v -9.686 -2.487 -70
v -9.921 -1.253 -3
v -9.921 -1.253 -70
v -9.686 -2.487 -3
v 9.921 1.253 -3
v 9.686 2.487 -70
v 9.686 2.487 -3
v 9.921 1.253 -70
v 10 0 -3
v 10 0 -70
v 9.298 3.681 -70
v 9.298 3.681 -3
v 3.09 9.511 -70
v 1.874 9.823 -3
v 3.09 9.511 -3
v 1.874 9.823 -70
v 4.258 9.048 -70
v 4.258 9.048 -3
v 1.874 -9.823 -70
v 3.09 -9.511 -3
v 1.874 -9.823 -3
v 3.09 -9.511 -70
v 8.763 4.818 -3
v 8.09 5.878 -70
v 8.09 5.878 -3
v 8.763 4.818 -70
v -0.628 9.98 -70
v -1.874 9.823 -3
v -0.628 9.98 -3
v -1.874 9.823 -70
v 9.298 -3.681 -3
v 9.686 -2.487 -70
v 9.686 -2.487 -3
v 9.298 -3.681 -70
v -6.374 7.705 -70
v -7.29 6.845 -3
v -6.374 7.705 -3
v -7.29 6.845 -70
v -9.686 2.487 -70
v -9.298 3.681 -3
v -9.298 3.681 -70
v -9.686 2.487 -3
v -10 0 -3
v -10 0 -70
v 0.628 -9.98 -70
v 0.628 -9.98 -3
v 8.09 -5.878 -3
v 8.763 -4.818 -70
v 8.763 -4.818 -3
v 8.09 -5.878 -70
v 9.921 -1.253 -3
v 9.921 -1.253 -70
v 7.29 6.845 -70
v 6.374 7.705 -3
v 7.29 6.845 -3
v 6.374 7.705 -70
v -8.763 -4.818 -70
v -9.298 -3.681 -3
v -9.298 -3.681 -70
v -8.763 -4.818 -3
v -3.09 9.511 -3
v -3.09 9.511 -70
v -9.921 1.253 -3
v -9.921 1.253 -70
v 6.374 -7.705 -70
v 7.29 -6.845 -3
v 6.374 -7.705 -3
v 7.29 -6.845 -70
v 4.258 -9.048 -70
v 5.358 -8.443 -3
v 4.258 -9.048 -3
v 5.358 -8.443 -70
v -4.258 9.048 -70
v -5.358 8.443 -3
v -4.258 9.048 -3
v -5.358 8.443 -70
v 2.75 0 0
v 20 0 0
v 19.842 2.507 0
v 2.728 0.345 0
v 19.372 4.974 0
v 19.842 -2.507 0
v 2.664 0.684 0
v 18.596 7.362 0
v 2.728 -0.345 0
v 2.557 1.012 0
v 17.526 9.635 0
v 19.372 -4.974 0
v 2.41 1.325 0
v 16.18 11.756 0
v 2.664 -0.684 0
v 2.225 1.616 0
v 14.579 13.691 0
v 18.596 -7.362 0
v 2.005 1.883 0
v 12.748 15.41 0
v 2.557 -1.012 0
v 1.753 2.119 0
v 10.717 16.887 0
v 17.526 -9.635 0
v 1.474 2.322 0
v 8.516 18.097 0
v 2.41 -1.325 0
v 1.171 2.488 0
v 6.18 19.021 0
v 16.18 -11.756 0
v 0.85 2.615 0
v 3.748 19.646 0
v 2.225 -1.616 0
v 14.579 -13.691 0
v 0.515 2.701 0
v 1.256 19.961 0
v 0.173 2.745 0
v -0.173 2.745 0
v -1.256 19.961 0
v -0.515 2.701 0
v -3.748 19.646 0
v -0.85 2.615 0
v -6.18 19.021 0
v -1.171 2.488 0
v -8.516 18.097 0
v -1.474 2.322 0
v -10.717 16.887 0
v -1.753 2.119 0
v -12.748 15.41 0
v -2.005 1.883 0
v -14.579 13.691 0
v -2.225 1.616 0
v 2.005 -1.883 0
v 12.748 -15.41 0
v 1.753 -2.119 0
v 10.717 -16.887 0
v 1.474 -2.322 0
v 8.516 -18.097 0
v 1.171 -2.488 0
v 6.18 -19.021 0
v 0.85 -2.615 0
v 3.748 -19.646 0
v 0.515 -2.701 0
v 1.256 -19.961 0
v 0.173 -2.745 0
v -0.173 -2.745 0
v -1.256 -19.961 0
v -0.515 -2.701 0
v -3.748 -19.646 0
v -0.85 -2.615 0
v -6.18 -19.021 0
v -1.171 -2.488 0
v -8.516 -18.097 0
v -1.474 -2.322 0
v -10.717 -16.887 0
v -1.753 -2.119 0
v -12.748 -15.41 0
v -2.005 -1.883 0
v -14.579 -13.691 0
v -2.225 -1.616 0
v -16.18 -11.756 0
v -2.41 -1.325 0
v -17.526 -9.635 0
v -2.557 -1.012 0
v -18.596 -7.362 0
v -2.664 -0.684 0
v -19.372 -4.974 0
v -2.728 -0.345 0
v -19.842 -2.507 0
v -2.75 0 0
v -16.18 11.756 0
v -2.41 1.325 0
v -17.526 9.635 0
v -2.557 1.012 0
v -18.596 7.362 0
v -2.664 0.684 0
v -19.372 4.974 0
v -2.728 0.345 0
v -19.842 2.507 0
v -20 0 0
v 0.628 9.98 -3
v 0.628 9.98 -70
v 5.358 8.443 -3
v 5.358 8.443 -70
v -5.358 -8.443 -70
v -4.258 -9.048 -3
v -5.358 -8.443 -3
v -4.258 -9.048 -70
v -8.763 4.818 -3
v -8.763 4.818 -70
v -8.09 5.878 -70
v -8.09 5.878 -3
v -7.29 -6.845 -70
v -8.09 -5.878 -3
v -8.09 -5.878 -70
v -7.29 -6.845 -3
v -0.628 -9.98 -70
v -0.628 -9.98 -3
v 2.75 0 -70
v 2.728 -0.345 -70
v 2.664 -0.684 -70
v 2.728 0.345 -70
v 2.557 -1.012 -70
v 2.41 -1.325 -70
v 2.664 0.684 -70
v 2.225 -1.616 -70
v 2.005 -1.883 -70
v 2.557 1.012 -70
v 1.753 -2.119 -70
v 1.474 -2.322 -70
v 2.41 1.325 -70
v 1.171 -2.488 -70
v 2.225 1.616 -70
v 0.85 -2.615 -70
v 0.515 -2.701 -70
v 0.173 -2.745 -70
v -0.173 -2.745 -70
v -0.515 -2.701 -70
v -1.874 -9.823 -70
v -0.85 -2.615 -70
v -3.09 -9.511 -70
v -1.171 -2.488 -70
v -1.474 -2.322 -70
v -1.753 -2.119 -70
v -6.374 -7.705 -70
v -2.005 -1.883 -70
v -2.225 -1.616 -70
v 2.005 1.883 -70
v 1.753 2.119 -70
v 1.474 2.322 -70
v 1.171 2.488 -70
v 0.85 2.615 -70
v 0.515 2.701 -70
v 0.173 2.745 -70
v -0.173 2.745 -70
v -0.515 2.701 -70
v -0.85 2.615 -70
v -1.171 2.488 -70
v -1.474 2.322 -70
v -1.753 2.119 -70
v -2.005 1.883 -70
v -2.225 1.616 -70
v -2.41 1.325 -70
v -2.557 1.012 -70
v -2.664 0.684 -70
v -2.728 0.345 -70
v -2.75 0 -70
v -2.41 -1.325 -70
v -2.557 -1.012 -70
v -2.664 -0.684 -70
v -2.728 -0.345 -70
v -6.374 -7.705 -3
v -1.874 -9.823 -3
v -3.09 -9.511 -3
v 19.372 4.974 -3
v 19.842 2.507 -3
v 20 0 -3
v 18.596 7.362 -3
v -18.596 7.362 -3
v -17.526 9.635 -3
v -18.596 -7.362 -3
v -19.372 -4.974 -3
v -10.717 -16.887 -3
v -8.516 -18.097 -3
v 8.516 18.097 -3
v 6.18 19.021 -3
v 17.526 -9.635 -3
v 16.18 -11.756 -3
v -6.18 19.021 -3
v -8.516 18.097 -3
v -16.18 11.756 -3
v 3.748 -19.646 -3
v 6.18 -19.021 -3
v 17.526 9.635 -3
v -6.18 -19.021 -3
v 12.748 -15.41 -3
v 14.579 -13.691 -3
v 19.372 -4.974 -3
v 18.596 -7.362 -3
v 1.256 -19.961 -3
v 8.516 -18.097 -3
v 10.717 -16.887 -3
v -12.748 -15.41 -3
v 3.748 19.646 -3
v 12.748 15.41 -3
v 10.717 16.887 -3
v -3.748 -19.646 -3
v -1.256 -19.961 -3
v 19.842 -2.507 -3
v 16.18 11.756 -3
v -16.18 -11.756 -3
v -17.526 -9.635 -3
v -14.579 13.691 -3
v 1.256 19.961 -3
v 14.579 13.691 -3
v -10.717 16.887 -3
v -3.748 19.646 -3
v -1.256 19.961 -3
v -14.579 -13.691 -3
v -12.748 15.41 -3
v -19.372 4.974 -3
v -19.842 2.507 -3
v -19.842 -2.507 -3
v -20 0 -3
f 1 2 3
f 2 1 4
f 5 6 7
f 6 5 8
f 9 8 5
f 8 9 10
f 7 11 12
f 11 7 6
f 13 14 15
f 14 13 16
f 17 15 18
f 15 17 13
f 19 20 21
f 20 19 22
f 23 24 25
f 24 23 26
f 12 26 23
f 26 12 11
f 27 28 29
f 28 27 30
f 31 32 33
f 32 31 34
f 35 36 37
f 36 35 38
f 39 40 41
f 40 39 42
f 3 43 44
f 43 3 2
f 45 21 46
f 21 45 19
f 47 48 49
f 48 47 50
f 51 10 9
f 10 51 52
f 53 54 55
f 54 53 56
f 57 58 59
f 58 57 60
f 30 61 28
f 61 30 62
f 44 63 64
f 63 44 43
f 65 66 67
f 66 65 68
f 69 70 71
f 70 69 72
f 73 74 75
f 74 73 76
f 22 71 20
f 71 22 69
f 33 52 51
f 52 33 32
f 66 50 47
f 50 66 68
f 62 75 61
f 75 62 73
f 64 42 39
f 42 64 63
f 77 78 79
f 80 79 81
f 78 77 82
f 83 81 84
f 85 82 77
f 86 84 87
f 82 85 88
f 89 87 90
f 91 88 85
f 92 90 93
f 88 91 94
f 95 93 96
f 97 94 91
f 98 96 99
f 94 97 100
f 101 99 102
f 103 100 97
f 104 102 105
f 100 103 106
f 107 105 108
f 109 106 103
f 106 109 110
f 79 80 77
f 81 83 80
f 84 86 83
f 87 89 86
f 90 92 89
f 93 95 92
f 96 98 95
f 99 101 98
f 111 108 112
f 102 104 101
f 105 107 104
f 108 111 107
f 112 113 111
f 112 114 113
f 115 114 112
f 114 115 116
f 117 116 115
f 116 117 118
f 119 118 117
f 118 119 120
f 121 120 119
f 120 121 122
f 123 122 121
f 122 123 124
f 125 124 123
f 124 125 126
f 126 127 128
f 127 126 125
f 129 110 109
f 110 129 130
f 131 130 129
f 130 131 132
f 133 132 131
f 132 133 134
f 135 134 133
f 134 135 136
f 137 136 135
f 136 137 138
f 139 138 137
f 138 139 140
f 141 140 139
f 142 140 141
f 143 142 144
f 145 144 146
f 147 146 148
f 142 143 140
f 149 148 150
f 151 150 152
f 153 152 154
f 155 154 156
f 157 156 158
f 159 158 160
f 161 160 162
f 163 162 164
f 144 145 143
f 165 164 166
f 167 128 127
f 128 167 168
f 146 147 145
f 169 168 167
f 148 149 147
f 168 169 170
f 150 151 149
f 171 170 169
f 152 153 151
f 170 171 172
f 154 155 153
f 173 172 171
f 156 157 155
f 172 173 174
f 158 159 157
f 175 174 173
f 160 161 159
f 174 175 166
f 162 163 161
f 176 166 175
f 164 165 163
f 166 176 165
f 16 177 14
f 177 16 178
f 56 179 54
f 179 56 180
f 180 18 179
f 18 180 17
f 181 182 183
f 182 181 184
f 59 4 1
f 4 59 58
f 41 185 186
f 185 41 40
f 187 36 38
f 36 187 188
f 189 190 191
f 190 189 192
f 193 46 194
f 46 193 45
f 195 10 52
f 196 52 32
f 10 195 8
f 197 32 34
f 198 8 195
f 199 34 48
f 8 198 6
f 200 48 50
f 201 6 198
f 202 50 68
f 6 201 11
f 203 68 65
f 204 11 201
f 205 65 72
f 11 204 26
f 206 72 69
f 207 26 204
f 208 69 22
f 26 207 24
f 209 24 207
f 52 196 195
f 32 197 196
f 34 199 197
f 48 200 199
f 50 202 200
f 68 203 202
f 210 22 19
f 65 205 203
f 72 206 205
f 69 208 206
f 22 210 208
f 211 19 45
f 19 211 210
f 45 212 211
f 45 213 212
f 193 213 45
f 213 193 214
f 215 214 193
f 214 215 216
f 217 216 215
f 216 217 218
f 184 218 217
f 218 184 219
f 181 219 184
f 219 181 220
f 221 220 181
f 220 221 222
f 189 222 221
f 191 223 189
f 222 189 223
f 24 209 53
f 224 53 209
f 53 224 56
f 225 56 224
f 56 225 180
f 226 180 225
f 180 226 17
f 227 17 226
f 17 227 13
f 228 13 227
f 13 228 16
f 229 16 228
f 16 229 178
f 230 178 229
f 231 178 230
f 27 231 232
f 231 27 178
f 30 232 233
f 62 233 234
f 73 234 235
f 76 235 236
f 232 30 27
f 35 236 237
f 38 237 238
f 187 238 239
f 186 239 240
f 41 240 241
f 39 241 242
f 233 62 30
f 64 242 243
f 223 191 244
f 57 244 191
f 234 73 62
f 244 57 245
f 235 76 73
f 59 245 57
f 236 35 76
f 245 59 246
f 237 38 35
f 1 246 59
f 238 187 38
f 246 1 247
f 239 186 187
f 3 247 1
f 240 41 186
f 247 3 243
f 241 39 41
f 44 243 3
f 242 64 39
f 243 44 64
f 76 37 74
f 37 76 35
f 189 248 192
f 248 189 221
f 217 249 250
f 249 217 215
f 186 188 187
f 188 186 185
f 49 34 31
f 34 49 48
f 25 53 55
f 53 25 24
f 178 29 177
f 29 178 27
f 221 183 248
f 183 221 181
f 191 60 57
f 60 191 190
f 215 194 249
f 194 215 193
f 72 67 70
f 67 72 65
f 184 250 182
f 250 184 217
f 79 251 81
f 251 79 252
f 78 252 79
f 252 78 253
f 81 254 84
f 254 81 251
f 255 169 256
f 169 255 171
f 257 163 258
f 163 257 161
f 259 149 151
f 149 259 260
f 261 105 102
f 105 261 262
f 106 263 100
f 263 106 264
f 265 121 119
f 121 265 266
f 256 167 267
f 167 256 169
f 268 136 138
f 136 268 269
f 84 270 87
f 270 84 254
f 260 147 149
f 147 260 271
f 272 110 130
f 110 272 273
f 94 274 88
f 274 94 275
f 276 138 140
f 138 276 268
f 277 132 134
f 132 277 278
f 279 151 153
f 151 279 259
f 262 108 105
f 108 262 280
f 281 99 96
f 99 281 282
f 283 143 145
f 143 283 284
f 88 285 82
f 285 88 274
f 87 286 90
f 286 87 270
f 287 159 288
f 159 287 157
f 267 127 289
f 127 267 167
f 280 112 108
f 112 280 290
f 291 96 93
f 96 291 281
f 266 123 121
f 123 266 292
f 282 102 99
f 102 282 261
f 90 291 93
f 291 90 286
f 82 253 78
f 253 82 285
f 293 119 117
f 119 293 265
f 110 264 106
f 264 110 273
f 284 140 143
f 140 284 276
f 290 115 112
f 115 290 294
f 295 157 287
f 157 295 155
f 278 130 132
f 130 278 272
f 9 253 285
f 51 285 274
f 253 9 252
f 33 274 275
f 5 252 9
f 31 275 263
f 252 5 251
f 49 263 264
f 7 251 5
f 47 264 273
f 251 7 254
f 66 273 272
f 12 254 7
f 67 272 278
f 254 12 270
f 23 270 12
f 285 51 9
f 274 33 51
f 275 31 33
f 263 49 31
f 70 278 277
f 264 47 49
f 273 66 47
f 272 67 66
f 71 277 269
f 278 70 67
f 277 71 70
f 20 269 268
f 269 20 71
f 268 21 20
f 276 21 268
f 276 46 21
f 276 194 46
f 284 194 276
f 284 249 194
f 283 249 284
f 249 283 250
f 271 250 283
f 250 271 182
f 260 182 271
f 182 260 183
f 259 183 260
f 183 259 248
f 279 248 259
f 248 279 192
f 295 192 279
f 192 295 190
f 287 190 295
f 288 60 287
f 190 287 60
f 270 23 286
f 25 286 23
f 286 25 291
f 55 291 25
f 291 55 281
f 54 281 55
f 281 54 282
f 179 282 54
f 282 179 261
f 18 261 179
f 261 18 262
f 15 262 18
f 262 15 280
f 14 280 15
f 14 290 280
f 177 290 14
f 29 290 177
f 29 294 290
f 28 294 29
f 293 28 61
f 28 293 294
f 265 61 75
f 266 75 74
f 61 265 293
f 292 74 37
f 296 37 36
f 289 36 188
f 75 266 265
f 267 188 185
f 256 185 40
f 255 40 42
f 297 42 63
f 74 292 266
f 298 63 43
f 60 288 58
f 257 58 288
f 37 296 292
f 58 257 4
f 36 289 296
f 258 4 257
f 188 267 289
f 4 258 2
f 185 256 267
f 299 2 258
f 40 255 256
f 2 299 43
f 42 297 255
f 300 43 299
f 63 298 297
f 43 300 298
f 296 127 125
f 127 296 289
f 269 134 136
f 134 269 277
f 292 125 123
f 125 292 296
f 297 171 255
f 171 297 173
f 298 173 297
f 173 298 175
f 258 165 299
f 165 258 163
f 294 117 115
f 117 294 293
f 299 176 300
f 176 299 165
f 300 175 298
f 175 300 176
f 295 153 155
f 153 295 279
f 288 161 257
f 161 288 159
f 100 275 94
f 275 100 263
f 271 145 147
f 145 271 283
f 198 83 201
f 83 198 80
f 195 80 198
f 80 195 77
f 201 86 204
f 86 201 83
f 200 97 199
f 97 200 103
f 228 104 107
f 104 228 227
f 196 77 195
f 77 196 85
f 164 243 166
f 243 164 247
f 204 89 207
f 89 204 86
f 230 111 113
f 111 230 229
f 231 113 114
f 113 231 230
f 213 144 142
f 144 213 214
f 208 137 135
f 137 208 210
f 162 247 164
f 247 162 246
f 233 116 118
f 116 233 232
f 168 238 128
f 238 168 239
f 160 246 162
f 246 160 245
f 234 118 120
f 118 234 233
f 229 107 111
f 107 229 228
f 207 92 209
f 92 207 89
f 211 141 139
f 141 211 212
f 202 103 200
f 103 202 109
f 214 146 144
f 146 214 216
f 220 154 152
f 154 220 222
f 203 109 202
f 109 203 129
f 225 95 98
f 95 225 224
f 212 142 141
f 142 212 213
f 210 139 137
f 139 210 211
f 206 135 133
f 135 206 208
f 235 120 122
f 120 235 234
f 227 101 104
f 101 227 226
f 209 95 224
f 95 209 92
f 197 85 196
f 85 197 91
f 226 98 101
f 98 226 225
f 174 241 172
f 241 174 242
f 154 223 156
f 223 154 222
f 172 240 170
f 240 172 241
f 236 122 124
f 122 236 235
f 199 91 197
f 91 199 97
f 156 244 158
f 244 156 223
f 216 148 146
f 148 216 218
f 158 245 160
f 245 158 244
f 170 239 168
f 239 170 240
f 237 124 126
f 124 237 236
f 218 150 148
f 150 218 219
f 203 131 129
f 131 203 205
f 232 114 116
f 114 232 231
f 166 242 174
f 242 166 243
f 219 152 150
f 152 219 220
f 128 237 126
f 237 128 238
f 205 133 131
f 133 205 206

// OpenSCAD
$fn = 50;


difference() {
	union() {
		translate(v = [0, 0, -70.0000000000]) {
			cylinder(h = 70, r = 10.0000000000);
		}
		translate(v = [0, 0, -3.0000000000]) {
			cylinder(h = 3, r = 20.0000000000);
		}
	}
	union() {
		#translate(v = [0, 0, -70]) {
			cylinder(h = 70, r = 2.7500000000);
		}
	}
}
